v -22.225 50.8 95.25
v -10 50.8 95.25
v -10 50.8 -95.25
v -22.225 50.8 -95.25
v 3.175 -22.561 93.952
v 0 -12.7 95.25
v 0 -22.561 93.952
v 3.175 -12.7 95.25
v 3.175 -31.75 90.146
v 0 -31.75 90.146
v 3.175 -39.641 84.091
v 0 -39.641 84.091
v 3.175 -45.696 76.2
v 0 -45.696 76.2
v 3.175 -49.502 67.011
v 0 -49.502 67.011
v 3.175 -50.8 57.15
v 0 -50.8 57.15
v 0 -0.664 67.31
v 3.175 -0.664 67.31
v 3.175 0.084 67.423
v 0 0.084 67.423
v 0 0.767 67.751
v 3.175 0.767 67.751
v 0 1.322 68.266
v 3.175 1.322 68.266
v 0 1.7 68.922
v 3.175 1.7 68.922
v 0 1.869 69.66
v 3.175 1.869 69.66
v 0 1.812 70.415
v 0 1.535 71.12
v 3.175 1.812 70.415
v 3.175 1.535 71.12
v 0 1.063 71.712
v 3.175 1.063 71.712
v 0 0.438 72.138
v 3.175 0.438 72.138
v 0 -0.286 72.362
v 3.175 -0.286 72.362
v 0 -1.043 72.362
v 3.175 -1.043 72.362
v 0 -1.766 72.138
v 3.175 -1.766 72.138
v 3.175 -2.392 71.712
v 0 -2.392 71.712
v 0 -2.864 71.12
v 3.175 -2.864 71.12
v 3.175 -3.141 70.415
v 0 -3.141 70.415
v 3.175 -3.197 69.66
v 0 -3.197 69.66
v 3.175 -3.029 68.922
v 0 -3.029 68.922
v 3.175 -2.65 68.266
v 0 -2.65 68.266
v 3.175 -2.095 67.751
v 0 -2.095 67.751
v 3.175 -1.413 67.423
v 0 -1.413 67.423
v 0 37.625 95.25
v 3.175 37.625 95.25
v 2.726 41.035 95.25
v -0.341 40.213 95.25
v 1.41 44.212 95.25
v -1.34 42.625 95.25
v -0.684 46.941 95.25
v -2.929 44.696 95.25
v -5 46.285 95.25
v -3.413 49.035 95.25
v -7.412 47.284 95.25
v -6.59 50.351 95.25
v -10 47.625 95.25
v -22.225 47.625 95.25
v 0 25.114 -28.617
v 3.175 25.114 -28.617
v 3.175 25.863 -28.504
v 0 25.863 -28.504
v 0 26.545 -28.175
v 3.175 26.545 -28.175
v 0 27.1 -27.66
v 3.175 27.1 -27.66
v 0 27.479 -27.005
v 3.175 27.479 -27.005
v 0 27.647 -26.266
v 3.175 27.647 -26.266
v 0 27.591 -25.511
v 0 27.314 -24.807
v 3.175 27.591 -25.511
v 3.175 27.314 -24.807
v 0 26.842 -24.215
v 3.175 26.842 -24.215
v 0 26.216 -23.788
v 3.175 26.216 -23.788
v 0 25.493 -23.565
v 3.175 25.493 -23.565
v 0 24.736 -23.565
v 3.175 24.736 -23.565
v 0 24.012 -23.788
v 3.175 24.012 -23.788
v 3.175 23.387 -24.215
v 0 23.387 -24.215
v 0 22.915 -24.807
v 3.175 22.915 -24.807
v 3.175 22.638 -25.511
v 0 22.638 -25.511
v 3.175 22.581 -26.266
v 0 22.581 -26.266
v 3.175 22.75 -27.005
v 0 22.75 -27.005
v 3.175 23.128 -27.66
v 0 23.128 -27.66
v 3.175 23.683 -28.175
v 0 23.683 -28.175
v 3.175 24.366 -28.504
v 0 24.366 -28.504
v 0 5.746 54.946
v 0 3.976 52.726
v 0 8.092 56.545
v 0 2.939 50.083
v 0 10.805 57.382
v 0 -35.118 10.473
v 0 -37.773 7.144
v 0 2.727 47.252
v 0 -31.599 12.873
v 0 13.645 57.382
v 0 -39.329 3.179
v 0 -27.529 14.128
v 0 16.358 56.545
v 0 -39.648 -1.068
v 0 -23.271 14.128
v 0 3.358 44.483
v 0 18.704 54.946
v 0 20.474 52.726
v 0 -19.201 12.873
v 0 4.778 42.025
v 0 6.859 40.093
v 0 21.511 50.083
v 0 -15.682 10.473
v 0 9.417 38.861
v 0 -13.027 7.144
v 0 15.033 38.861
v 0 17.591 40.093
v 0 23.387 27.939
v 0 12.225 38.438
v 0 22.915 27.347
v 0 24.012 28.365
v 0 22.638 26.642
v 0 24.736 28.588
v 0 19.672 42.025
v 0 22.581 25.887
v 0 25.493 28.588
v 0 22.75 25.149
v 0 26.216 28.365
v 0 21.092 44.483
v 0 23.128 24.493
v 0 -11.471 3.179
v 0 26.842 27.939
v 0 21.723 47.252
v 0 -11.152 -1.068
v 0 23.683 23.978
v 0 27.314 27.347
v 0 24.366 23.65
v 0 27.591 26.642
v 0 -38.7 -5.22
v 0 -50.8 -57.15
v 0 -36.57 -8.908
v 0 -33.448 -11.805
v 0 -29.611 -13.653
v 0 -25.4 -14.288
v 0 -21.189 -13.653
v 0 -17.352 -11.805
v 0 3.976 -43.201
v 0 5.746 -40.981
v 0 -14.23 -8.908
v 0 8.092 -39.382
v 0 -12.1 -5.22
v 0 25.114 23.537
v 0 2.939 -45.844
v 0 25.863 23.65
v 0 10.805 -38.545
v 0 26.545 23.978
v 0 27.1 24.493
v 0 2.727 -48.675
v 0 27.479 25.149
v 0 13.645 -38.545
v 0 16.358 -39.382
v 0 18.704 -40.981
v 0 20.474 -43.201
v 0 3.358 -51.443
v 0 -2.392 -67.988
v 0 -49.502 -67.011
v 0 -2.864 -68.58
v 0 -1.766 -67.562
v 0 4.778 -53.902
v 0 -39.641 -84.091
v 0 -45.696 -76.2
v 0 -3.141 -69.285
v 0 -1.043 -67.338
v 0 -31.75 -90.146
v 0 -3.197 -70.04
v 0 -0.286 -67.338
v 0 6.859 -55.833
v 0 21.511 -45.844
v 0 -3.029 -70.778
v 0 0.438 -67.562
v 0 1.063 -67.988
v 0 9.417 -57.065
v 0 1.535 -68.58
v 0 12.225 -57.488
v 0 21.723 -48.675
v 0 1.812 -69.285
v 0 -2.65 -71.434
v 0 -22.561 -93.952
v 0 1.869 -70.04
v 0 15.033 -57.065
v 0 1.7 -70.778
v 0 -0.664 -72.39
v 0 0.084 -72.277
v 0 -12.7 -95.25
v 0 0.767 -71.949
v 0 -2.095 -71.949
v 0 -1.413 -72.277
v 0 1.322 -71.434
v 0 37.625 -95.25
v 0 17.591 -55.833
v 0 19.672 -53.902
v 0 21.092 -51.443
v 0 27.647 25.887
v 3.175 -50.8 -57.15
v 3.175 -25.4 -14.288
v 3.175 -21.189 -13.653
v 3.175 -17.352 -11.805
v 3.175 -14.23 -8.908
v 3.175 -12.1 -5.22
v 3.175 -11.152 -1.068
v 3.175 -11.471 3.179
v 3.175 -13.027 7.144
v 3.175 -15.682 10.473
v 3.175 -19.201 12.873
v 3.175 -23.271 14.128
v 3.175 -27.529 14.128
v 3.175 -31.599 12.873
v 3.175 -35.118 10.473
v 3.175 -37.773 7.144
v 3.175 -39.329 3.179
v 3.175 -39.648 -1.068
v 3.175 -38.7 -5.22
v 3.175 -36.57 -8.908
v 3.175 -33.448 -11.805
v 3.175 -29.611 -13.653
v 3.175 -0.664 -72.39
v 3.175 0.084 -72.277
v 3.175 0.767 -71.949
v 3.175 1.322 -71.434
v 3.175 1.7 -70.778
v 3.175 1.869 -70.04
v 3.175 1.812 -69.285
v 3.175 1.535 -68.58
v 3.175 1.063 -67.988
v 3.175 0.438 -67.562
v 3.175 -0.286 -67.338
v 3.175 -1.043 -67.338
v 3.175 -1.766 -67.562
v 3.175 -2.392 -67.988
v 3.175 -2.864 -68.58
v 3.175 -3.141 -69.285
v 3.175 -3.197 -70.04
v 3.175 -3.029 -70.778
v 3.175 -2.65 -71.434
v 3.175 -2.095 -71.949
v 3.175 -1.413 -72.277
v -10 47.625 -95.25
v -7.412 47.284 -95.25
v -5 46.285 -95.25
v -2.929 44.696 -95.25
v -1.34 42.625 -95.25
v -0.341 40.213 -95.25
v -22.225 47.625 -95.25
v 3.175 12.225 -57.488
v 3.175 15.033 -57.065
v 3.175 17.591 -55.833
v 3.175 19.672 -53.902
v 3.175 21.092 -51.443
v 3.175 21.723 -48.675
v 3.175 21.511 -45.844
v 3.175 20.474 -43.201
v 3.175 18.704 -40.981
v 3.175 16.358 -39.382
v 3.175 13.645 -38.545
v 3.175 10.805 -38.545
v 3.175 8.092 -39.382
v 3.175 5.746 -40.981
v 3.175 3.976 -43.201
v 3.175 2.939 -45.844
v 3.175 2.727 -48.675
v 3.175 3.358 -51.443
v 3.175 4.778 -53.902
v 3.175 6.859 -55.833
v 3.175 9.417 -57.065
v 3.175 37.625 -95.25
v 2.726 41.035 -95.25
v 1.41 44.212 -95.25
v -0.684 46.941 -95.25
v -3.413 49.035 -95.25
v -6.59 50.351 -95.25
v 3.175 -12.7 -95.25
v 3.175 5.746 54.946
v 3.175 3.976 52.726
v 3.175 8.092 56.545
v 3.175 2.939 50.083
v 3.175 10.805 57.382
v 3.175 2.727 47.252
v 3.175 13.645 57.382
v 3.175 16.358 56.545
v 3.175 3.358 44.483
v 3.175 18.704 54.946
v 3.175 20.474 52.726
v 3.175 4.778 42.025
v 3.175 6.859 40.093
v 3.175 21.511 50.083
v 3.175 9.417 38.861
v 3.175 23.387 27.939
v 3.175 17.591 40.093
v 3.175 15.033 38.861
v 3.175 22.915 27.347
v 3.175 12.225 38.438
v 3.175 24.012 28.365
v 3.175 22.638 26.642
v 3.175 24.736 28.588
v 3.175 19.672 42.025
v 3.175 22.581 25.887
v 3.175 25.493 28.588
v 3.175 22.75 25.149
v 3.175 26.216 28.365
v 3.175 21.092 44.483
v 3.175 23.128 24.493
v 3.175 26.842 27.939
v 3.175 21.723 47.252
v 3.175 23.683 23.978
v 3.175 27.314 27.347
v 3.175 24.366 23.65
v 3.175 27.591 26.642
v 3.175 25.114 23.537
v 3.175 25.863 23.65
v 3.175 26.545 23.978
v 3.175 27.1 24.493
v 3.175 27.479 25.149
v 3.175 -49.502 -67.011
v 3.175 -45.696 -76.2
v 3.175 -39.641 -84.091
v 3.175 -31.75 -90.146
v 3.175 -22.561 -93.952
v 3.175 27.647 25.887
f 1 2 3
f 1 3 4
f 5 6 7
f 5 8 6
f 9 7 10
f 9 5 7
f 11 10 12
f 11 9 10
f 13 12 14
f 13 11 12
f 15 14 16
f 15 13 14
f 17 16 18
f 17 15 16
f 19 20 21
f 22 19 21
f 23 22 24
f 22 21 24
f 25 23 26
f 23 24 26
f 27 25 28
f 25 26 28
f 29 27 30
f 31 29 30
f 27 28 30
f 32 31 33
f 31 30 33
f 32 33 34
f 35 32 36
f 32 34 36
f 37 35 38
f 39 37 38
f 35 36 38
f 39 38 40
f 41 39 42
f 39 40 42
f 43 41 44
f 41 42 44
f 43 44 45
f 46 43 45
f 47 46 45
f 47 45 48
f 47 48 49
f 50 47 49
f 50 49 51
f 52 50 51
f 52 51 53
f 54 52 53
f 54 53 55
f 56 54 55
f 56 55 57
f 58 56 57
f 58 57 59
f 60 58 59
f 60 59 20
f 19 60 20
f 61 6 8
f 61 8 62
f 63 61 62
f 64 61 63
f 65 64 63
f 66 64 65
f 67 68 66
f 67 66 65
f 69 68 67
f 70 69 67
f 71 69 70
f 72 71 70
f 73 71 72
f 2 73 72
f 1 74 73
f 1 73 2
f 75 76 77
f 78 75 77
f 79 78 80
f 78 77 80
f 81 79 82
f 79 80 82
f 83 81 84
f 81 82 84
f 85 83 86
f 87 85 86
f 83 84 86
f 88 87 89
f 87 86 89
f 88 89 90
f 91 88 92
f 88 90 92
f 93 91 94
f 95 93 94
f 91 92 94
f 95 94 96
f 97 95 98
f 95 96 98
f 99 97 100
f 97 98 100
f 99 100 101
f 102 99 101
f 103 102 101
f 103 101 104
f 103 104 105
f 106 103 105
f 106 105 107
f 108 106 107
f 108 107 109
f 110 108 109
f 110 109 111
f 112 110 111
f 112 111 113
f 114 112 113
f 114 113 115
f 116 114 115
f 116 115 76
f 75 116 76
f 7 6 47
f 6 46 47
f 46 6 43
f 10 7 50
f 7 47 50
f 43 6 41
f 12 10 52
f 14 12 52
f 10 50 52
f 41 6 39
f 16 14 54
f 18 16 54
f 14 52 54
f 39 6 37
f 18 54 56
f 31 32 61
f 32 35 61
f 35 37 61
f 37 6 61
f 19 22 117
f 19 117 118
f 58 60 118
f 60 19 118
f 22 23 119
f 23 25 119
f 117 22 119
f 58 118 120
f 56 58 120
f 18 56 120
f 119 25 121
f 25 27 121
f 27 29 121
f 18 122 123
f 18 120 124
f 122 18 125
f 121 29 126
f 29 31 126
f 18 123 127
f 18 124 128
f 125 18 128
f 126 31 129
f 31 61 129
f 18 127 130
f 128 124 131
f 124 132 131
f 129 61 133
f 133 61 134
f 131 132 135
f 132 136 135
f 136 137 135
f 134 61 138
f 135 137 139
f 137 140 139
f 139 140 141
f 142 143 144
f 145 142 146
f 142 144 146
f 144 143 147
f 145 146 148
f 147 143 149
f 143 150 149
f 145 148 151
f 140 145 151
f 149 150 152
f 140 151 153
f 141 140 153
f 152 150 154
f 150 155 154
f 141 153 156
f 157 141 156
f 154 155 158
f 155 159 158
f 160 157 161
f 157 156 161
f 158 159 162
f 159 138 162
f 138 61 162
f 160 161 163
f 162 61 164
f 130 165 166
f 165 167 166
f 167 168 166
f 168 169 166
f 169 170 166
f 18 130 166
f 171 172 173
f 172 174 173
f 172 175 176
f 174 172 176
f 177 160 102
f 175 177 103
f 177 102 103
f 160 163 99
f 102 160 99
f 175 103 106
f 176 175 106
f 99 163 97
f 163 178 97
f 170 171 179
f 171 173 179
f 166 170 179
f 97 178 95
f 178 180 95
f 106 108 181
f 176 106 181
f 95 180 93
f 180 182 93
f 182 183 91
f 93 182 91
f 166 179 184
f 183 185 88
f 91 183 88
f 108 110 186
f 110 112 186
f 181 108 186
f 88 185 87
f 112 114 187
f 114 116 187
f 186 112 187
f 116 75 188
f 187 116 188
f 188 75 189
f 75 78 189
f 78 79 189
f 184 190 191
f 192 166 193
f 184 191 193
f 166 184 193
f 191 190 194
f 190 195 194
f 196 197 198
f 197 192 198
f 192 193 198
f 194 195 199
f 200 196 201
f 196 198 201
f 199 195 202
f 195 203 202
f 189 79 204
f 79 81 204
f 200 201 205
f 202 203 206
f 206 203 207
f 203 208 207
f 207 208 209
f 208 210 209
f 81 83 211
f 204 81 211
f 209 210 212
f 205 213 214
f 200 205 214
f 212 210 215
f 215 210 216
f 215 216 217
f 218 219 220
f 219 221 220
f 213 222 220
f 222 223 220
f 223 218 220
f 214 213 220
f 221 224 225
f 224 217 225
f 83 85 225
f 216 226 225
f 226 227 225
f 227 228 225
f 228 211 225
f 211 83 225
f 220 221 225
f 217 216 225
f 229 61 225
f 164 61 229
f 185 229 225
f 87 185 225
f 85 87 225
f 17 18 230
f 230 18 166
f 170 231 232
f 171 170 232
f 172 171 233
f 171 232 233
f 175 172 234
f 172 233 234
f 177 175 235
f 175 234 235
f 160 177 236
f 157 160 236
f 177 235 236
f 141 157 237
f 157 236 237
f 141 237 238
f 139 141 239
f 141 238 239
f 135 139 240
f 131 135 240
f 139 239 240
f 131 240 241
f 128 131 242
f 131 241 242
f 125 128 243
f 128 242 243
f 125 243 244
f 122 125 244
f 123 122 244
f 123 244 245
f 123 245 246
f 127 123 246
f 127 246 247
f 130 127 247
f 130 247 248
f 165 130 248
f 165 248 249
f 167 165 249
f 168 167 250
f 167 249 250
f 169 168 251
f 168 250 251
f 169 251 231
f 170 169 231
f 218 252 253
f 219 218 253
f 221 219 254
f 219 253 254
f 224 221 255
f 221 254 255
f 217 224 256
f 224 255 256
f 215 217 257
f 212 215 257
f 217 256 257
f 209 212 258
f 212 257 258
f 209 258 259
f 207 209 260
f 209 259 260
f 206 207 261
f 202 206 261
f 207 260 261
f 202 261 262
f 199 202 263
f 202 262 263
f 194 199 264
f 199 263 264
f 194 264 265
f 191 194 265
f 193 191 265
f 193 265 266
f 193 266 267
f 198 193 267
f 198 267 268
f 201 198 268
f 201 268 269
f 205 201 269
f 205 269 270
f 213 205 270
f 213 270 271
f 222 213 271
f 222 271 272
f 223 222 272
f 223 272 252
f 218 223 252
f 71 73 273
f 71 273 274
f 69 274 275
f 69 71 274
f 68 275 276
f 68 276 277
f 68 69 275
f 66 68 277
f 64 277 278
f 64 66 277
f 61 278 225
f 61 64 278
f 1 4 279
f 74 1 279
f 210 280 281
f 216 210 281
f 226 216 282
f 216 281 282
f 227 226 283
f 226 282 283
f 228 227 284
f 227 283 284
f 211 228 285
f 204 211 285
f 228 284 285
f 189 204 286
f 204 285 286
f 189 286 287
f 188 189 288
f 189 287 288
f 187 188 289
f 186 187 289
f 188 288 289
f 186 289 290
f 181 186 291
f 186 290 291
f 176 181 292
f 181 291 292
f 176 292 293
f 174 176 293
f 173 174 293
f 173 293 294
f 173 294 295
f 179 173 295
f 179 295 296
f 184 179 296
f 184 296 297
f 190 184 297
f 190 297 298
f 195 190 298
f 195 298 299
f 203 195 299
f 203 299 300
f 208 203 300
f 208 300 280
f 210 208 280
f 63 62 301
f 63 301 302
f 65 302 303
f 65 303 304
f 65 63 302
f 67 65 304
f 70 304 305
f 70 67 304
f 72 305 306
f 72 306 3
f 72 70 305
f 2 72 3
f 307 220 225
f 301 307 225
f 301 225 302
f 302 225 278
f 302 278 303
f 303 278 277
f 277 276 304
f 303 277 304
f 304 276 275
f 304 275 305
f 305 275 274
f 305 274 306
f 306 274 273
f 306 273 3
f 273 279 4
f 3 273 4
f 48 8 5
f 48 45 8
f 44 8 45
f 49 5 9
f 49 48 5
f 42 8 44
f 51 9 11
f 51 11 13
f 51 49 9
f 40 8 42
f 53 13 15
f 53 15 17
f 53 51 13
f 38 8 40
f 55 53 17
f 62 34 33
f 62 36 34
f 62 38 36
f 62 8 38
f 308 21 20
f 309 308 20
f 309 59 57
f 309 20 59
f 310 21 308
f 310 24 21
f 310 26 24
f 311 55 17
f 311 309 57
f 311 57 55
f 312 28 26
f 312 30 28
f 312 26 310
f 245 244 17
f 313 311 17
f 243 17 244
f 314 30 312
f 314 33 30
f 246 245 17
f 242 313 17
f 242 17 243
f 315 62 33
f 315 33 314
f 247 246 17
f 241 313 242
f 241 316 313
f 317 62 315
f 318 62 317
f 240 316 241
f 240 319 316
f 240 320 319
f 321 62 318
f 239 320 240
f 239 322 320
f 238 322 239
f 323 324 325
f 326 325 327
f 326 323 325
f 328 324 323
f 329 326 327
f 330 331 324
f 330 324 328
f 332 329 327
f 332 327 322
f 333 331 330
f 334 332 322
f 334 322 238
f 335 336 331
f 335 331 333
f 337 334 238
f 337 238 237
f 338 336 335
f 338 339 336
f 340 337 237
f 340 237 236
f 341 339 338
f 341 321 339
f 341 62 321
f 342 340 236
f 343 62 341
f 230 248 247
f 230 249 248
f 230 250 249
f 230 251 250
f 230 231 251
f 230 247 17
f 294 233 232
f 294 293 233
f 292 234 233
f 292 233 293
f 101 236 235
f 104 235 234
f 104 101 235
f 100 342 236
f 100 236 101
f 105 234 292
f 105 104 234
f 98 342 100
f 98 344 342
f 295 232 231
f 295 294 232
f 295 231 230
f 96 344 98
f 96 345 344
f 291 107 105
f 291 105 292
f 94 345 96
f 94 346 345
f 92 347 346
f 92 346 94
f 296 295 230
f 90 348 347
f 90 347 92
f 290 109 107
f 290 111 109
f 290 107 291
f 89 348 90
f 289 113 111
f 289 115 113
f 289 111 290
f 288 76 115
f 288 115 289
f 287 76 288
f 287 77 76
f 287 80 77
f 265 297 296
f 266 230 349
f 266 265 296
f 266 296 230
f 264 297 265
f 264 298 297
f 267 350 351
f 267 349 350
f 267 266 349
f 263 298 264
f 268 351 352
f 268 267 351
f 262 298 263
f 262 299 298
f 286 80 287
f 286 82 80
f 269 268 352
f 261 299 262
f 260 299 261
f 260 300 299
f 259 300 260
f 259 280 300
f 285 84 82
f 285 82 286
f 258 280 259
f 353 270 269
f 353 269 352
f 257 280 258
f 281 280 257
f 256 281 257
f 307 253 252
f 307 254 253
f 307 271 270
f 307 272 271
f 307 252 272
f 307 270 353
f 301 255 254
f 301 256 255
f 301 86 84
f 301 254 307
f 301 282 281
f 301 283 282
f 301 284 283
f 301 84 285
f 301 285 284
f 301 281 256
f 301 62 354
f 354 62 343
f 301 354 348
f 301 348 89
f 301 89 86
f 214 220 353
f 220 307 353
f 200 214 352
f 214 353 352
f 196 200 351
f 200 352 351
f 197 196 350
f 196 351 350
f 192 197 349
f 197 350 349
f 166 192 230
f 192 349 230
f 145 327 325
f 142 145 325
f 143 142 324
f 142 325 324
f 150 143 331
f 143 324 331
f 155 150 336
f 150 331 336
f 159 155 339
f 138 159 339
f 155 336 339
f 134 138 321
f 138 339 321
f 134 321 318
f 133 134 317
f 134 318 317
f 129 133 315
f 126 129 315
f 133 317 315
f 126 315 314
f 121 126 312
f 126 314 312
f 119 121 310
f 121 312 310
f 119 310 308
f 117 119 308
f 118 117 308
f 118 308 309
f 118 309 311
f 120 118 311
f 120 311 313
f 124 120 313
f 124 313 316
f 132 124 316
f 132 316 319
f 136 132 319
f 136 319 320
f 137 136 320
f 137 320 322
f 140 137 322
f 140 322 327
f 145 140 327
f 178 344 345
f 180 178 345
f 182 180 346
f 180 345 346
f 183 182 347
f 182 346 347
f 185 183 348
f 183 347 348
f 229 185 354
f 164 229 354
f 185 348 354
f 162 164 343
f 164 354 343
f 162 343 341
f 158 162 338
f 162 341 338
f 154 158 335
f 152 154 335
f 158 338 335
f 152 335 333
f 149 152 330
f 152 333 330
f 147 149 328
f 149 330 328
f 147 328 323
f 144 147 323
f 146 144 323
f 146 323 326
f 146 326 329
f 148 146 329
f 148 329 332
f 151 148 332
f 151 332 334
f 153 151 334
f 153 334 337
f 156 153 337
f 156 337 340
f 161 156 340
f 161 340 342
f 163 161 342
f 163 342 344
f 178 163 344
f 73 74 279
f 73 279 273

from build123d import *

# Parameters (mm, degrees)
SKETCH1_W                    = 190.5
SKETCH1_H                    = 101.6
BOSS_EXTRUDE1_DEPTH          = 3.175
SKETCH2_R                    = 14.2875
CUT_EXTRUDE1_DEPTH           = 3.175
EDGE_FLANGE1_STRIP_W         = 32.7
EDGE_FLANGE1_STRIP_H         = 3.175
EDGE_FLANGE1_STRIP_CUT_DEPTH = 190.5
EDGE_FLANGE1_DEPTH           = 190.5
SKETCH12_R                   = 9.525
SKETCH12_R_2                 = 2.54
CUT_EXTRUDE2_DEPTH           = 7.62
FILLET1_R                    = 38.1


# Sheet-metal steps are written as plain solids
with BuildPart() as part:
    # Sketch1 → Boss-Extrude1 (new body)
    with BuildSketch(Plane(origin=(0, 0, 0), x_dir=(0, 0, -1), z_dir=(1, 0, 0))):
        Rectangle(SKETCH1_W, SKETCH1_H)
    extrude(amount=BOSS_EXTRUDE1_DEPTH)

    # Sketch2 → Cut-Extrude1 (cut)
    with BuildSketch(Plane(origin=(3.175, 0, 0), x_dir=(0, 0, -1), z_dir=(1, 0, 0))):
        with Locations((0, -25.4)):
            Circle(SKETCH2_R)
    extrude(amount=-CUT_EXTRUDE1_DEPTH, mode=Mode.SUBTRACT)

    # Edge-Flange1 strip (across the edge) → Edge-Flange1 strip cut (cut)
    with BuildSketch(Plane(origin=(0, 50.8, 95.25), x_dir=(0, -1, 0), z_dir=(0, 0, -1))):
        with Locations((-3.175, -1.5875)):
            Rectangle(EDGE_FLANGE1_STRIP_W, EDGE_FLANGE1_STRIP_H)
    extrude(amount=EDGE_FLANGE1_STRIP_CUT_DEPTH, mode=Mode.SUBTRACT)

    # Edge-Flange1 section (across the edge) → Edge-Flange1 (add)
    with BuildSketch(Plane(origin=(0, 50.8, 95.25), x_dir=(0, -1, 0), z_dir=(0, 0, -1))):
        with BuildLine():
            Line((0, 10), (0, 22.225))
            Line((0, 22.225), (3.175, 22.225))
            Line((3.175, 22.225), (3.175, 10))
            ThreePointArc((3.175, 10), (6.103932188, 2.928932188), (13.175, 0))
            Line((13.175, 0), (13.175, -3.175))
            ThreePointArc((13.175, -3.175), (3.858868158, 0.683868158), (0, 10))
        make_face()
    extrude(amount=EDGE_FLANGE1_DEPTH)

    # Sketch12 → Cut-Extrude2 (cut)
    with BuildSketch(Plane(origin=(3.175, 0, 0), x_dir=(0, 0, -1), z_dir=(1, 0, 0))):
        with Locations((-47.963329482, 12.225)):
            Circle(SKETCH12_R)
        with Locations((-26.076658964, 25.11428445)):
            Circle(SKETCH12_R_2)
        with Locations((-69.85, -0.66428445)):
            Circle(SKETCH12_R_2)
        with Locations((47.963329482, 12.225)):
            Circle(SKETCH12_R)
        with Locations((26.076658964, 25.11428445)):
            Circle(SKETCH12_R_2)
        with Locations((69.85, -0.66428445)):
            Circle(SKETCH12_R_2)
    extrude(amount=-CUT_EXTRUDE2_DEPTH, mode=Mode.SUBTRACT)

    # Fillet1
    fillet1_edges = [part.edges().sort_by_distance(p)[0] for p in [
        (1.5875, -50.8, 95.25),
        (1.5875, -50.8, -95.25),
    ]]
    fillet(fillet1_edges, radius=FILLET1_R)


solid = part.part
